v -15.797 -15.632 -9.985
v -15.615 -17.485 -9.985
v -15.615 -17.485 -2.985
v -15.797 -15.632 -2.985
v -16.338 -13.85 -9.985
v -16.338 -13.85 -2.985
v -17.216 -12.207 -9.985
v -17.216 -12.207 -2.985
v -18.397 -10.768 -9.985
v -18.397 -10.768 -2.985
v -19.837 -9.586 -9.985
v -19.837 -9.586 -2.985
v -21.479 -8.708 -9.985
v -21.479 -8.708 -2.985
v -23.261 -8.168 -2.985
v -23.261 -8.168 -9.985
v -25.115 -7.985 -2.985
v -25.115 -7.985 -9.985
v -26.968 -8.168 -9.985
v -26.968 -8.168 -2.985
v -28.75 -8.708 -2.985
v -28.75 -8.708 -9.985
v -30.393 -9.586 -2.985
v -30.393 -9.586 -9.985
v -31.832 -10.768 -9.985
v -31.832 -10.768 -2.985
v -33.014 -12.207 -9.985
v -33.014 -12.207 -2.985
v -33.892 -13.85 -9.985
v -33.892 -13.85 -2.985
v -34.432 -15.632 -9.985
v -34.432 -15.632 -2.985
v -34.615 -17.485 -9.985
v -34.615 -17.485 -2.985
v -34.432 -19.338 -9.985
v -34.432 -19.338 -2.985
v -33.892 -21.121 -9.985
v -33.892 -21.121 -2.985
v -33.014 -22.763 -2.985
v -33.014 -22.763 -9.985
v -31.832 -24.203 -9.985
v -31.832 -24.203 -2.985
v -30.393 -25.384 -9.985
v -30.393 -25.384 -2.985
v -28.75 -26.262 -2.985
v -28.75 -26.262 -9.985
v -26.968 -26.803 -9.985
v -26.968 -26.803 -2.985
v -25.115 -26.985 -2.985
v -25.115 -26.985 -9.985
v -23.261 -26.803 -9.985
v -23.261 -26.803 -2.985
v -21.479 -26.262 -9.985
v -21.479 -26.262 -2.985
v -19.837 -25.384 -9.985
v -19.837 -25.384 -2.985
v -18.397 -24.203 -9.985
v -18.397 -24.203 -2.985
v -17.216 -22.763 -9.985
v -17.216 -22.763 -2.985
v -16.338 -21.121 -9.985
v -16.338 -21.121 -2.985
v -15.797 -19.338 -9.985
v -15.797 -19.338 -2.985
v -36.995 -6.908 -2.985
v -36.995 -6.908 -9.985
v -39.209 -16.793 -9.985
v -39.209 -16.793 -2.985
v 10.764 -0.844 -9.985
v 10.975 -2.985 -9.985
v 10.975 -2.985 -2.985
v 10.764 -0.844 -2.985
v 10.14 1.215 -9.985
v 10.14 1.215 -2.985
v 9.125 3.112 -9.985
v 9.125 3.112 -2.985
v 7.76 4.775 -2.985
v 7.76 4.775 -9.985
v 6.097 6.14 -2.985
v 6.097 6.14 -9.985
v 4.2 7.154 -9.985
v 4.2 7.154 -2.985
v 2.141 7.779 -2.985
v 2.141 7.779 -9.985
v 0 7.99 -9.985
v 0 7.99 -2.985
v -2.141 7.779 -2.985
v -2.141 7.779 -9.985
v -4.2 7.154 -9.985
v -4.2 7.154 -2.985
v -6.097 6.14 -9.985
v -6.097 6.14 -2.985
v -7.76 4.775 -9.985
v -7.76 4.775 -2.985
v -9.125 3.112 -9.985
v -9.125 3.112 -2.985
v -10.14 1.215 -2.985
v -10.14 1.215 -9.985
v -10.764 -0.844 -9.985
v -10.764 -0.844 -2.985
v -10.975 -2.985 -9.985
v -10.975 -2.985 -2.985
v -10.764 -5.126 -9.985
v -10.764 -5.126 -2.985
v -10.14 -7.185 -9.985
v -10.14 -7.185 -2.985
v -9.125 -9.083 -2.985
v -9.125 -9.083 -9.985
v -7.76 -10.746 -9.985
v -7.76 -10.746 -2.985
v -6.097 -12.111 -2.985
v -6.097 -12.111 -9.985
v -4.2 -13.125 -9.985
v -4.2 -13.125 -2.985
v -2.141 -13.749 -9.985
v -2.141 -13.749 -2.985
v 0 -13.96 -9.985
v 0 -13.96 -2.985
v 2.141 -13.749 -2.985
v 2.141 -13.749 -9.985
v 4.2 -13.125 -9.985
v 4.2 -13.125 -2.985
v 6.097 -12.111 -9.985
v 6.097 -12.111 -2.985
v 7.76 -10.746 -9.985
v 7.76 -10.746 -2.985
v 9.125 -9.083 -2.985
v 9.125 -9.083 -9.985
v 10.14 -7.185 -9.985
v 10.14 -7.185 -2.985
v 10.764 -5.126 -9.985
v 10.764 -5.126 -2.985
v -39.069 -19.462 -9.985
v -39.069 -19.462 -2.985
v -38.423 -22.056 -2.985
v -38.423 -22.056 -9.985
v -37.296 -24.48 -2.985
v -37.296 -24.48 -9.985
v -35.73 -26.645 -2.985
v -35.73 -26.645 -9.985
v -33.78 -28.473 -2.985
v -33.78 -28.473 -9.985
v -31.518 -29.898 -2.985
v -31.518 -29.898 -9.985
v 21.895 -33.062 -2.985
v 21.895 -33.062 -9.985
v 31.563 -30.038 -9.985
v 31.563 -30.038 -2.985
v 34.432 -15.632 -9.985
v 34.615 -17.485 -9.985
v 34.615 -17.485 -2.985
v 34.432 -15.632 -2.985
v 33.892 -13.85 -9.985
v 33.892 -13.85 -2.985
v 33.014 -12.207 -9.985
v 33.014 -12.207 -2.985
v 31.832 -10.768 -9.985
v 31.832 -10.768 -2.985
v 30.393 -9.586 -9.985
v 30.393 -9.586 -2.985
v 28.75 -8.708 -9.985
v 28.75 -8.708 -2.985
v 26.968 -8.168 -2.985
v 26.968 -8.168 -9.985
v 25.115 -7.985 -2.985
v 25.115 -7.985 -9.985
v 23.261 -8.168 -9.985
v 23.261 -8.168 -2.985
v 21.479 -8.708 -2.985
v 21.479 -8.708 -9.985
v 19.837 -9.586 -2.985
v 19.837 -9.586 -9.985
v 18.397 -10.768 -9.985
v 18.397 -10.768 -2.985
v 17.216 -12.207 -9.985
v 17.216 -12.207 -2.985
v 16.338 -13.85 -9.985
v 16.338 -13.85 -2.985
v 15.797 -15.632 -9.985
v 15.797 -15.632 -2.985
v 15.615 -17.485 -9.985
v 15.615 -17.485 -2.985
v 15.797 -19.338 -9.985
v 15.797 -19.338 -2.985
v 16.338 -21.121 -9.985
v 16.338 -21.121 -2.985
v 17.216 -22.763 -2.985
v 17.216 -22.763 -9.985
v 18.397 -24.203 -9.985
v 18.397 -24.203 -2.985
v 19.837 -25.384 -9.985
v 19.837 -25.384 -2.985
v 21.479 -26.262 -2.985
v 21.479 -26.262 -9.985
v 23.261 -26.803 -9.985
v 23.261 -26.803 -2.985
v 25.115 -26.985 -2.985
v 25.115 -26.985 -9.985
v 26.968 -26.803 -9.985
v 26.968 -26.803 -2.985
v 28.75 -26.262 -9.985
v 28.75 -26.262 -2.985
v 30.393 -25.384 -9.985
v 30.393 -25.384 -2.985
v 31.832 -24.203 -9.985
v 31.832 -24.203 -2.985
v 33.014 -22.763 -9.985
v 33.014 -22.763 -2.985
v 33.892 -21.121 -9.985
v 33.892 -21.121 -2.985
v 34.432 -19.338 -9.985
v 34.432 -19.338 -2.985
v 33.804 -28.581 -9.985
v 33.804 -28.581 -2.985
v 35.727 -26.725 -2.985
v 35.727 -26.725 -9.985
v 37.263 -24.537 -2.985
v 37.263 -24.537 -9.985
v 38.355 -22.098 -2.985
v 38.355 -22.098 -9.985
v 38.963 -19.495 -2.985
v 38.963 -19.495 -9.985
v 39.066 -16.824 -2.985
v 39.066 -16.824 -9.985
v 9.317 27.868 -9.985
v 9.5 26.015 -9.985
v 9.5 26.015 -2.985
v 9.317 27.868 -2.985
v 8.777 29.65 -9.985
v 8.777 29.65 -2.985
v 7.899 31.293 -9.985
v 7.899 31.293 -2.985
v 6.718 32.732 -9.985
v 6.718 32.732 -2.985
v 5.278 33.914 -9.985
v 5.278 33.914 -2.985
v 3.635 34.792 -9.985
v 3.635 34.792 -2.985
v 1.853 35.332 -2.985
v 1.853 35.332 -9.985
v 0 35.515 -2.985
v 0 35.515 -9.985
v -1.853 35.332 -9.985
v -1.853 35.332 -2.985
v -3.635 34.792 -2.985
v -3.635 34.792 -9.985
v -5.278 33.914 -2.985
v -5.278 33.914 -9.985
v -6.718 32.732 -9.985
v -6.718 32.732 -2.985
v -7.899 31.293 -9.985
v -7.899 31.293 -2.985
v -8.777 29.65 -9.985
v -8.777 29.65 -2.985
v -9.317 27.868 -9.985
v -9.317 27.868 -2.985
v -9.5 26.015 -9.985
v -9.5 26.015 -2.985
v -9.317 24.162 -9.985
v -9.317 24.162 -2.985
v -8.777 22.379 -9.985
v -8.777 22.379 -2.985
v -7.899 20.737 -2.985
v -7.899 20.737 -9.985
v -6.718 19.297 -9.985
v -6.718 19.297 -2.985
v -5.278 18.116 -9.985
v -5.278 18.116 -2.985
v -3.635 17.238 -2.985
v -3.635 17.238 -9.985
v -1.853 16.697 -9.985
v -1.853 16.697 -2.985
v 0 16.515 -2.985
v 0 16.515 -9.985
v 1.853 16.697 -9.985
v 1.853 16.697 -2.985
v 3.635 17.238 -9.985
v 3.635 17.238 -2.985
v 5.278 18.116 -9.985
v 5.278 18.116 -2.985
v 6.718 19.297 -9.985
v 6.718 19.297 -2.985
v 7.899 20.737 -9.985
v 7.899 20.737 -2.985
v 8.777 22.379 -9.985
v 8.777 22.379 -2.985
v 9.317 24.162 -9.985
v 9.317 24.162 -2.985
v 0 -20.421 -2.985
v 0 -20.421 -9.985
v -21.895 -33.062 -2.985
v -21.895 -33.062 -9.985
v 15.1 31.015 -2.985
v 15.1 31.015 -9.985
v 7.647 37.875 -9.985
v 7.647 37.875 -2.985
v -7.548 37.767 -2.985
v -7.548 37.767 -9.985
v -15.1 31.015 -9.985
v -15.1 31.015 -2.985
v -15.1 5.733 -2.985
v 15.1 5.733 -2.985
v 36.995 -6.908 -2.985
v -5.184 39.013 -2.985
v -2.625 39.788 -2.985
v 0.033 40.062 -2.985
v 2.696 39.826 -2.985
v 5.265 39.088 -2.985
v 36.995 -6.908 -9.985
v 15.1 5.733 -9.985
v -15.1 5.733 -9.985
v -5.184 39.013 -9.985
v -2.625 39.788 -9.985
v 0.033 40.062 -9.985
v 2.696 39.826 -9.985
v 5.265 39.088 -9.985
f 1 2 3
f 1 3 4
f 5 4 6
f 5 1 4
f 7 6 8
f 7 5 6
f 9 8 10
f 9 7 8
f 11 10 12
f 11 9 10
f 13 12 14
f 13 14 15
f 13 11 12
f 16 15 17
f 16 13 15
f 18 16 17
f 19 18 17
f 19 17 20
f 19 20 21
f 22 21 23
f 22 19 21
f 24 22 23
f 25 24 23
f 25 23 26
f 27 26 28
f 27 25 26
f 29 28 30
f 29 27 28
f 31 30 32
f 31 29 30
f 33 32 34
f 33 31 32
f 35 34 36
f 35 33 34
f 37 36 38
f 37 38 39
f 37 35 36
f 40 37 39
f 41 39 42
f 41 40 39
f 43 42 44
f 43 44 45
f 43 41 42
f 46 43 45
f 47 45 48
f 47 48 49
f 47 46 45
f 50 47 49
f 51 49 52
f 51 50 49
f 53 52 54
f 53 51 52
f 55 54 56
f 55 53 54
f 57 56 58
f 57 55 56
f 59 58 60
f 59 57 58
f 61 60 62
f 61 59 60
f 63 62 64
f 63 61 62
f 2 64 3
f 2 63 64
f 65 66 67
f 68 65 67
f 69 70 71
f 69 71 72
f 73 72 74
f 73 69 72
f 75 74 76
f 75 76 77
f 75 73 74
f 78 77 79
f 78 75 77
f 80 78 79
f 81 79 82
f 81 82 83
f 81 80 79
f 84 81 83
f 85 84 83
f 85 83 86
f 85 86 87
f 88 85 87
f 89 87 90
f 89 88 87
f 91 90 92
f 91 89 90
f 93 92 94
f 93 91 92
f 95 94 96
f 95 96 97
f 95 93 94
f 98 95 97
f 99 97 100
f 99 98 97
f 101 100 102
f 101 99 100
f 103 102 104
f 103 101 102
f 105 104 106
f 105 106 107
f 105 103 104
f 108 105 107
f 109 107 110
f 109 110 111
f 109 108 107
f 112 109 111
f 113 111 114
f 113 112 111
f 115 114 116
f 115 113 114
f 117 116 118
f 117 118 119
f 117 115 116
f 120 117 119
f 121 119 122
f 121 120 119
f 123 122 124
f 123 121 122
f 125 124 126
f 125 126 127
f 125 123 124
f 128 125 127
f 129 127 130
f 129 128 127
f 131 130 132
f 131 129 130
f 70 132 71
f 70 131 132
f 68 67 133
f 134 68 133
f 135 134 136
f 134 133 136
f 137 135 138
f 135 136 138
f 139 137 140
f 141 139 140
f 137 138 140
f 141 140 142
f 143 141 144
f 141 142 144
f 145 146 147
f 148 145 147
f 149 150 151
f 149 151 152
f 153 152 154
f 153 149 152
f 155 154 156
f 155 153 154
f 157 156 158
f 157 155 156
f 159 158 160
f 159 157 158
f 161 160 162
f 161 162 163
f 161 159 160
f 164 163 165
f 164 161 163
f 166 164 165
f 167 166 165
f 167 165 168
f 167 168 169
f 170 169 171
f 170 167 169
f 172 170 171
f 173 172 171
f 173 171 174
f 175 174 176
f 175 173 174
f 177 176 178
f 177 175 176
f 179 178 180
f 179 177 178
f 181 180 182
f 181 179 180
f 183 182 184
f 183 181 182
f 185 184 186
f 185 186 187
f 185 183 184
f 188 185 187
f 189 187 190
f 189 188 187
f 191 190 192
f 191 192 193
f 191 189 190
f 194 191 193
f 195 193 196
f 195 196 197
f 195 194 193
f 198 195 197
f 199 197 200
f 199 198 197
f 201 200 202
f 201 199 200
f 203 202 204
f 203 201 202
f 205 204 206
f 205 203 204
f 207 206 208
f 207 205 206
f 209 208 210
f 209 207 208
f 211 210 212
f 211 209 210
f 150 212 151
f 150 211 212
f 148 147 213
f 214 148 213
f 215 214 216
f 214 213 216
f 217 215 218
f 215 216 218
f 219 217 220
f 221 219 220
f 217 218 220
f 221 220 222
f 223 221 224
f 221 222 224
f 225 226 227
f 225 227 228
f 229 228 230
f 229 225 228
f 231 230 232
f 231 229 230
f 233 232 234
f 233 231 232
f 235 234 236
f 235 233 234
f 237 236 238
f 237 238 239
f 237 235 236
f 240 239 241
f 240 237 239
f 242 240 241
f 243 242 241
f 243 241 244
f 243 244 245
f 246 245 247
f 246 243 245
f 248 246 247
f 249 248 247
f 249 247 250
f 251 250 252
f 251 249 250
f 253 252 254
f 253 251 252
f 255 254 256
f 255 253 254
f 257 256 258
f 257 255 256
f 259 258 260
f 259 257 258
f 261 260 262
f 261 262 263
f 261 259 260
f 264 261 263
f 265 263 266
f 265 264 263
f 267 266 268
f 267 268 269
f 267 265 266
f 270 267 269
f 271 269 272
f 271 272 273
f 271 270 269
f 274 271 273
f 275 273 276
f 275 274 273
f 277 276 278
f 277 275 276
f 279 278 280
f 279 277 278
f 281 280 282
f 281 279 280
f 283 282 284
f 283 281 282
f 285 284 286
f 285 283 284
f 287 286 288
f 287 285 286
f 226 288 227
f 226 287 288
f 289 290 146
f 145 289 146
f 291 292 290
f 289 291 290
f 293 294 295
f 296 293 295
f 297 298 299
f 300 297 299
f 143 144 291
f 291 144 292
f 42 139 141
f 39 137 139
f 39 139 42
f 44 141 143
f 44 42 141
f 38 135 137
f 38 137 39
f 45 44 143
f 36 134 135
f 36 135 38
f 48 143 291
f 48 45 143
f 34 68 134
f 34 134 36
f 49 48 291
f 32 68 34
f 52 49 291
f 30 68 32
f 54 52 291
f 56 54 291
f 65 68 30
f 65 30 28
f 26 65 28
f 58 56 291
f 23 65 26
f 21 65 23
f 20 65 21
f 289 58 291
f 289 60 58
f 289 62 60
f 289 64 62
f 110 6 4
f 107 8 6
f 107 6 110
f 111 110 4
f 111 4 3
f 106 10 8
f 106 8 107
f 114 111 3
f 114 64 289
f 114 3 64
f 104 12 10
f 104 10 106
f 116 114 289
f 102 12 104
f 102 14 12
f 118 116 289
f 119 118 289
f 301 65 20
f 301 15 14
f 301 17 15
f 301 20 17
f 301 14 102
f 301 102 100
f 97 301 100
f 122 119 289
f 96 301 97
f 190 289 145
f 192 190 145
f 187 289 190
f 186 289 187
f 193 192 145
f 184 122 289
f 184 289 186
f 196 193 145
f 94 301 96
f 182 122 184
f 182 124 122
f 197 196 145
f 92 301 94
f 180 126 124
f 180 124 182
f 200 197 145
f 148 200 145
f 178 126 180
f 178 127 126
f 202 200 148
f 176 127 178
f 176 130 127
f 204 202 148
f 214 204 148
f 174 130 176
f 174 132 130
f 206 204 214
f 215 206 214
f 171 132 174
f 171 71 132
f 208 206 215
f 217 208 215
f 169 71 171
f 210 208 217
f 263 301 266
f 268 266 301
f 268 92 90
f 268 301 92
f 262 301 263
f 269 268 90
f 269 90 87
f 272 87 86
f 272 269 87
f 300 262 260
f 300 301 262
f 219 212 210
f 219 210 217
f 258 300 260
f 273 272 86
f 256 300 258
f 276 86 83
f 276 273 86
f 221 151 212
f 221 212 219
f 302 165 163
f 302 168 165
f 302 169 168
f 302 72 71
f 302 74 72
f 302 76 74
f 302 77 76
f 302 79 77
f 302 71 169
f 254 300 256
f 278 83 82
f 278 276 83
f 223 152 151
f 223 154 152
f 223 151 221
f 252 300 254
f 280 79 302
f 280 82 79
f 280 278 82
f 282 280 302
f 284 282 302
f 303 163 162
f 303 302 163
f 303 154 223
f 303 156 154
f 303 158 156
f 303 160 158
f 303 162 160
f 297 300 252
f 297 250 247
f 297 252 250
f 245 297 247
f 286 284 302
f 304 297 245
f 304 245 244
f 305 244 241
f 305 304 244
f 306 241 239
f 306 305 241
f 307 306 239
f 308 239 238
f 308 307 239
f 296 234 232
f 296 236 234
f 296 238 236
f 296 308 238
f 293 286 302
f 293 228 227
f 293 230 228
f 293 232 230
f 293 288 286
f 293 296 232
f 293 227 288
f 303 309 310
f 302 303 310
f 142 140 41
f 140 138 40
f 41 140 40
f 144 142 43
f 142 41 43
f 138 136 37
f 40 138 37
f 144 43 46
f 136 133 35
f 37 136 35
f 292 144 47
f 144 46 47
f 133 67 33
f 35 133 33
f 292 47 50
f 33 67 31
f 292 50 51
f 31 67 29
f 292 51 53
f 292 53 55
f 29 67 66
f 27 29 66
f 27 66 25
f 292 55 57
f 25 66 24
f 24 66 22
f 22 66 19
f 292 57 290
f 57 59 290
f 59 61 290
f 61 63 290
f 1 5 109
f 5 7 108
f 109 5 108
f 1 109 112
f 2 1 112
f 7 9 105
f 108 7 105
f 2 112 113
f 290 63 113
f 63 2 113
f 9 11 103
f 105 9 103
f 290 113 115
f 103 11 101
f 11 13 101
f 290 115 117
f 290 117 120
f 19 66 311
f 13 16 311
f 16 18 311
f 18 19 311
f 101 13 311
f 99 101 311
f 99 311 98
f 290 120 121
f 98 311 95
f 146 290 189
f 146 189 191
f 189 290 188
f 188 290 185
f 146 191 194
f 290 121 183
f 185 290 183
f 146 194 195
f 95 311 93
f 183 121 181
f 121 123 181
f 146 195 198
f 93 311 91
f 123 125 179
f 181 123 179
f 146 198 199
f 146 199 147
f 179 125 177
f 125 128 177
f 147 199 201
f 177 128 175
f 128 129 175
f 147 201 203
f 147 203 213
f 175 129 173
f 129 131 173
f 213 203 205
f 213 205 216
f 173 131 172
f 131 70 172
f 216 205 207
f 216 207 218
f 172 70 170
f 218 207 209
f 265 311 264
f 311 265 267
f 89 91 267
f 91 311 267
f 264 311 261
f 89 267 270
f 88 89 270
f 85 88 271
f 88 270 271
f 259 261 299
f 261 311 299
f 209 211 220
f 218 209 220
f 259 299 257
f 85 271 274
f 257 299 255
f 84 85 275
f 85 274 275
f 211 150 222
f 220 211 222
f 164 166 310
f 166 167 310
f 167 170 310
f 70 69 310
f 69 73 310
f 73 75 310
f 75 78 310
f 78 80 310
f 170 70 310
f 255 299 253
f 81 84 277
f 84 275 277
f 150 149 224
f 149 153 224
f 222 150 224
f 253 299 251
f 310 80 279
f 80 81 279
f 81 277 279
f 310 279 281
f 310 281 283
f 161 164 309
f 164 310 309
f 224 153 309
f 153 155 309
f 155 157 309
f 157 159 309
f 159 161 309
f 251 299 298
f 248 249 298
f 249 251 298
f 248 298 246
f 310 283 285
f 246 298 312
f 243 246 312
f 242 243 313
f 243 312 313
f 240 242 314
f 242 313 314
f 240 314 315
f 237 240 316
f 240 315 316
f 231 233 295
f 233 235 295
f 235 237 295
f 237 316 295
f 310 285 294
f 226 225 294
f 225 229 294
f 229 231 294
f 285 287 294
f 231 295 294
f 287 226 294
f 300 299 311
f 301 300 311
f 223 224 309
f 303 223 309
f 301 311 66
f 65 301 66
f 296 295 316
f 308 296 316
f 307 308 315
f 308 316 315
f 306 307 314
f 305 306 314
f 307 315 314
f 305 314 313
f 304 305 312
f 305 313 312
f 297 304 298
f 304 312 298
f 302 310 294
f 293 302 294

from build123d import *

# Parameters (mm, degrees)
SKETCH2_R             = 10.975
SKETCH2_R_2           = 9.5
BOSS_EXTRUDE1_DEPTH   = 7
BODY_MOVE_COPY2_ANGLE = 90


with BuildPart() as part:
    # Sketch2 → Boss-Extrude1 (new body)
    with BuildSketch(Plane(origin=(0, 0, 0), x_dir=(1, 0, 0), z_dir=(0, 1, 0))):
        with BuildLine():
            Line((15.1, 8.717989065), (15.1, 34))
            Line((15.1, 34), (7.646696155, 40.860405367))
            ThreePointArc((7.646696155, 40.860405367), (0.033272999, 43.046889297), (-7.548090014, 40.751707603))
            Line((-7.548090014, 40.751707603), (-15.1, 34))
            Line((-15.1, 34), (-15.1, 8.717989065))
            Line((-15.1, 8.717989065), (-36.994863729, -3.923016403))
            Line((-36.994863729, -3.923016403), (-39.209497135, -13.807969558))
            ThreePointArc((-39.209497135, -13.807969558), (-37.296336185, -21.494629386), (-31.517969025, -26.912691504))
            Line((-31.517969025, -26.912691504), (-21.894863729, -30.076983597))
            Line((-21.894863729, -30.076983597), (0, -17.43597813))
            Line((0, -17.43597813), (21.894863729, -30.076983597))
            Line((21.894863729, -30.076983597), (31.562800979, -27.052435809))
            ThreePointArc((31.562800979, -27.052435809), (37.263063186, -21.552259911), (39.066059039, -13.8390161))
            Line((39.066059039, -13.8390161), (36.994863729, -3.923016403))
            Line((36.994863729, -3.923016403), (15.1, 8.717989065))
        make_face()
        Circle(SKETCH2_R, mode=Mode.SUBTRACT)
        with Locations((0, 29)):
            Circle(SKETCH2_R_2, mode=Mode.SUBTRACT)
        with Locations((25.11473671, -14.5)):
            Circle(SKETCH2_R_2, mode=Mode.SUBTRACT)
        with Locations((-25.11473671, -14.5)):
            Circle(SKETCH2_R_2, mode=Mode.SUBTRACT)
    extrude(amount=BOSS_EXTRUDE1_DEPTH)


with BuildPart() as part_1:
    # Body-Move/Copy2: moved
    add(part.part.rotate(Axis((0, 3.5, -6.485131953), (1, 0, 0)), BODY_MOVE_COPY2_ANGLE))


solid = part_1.part
